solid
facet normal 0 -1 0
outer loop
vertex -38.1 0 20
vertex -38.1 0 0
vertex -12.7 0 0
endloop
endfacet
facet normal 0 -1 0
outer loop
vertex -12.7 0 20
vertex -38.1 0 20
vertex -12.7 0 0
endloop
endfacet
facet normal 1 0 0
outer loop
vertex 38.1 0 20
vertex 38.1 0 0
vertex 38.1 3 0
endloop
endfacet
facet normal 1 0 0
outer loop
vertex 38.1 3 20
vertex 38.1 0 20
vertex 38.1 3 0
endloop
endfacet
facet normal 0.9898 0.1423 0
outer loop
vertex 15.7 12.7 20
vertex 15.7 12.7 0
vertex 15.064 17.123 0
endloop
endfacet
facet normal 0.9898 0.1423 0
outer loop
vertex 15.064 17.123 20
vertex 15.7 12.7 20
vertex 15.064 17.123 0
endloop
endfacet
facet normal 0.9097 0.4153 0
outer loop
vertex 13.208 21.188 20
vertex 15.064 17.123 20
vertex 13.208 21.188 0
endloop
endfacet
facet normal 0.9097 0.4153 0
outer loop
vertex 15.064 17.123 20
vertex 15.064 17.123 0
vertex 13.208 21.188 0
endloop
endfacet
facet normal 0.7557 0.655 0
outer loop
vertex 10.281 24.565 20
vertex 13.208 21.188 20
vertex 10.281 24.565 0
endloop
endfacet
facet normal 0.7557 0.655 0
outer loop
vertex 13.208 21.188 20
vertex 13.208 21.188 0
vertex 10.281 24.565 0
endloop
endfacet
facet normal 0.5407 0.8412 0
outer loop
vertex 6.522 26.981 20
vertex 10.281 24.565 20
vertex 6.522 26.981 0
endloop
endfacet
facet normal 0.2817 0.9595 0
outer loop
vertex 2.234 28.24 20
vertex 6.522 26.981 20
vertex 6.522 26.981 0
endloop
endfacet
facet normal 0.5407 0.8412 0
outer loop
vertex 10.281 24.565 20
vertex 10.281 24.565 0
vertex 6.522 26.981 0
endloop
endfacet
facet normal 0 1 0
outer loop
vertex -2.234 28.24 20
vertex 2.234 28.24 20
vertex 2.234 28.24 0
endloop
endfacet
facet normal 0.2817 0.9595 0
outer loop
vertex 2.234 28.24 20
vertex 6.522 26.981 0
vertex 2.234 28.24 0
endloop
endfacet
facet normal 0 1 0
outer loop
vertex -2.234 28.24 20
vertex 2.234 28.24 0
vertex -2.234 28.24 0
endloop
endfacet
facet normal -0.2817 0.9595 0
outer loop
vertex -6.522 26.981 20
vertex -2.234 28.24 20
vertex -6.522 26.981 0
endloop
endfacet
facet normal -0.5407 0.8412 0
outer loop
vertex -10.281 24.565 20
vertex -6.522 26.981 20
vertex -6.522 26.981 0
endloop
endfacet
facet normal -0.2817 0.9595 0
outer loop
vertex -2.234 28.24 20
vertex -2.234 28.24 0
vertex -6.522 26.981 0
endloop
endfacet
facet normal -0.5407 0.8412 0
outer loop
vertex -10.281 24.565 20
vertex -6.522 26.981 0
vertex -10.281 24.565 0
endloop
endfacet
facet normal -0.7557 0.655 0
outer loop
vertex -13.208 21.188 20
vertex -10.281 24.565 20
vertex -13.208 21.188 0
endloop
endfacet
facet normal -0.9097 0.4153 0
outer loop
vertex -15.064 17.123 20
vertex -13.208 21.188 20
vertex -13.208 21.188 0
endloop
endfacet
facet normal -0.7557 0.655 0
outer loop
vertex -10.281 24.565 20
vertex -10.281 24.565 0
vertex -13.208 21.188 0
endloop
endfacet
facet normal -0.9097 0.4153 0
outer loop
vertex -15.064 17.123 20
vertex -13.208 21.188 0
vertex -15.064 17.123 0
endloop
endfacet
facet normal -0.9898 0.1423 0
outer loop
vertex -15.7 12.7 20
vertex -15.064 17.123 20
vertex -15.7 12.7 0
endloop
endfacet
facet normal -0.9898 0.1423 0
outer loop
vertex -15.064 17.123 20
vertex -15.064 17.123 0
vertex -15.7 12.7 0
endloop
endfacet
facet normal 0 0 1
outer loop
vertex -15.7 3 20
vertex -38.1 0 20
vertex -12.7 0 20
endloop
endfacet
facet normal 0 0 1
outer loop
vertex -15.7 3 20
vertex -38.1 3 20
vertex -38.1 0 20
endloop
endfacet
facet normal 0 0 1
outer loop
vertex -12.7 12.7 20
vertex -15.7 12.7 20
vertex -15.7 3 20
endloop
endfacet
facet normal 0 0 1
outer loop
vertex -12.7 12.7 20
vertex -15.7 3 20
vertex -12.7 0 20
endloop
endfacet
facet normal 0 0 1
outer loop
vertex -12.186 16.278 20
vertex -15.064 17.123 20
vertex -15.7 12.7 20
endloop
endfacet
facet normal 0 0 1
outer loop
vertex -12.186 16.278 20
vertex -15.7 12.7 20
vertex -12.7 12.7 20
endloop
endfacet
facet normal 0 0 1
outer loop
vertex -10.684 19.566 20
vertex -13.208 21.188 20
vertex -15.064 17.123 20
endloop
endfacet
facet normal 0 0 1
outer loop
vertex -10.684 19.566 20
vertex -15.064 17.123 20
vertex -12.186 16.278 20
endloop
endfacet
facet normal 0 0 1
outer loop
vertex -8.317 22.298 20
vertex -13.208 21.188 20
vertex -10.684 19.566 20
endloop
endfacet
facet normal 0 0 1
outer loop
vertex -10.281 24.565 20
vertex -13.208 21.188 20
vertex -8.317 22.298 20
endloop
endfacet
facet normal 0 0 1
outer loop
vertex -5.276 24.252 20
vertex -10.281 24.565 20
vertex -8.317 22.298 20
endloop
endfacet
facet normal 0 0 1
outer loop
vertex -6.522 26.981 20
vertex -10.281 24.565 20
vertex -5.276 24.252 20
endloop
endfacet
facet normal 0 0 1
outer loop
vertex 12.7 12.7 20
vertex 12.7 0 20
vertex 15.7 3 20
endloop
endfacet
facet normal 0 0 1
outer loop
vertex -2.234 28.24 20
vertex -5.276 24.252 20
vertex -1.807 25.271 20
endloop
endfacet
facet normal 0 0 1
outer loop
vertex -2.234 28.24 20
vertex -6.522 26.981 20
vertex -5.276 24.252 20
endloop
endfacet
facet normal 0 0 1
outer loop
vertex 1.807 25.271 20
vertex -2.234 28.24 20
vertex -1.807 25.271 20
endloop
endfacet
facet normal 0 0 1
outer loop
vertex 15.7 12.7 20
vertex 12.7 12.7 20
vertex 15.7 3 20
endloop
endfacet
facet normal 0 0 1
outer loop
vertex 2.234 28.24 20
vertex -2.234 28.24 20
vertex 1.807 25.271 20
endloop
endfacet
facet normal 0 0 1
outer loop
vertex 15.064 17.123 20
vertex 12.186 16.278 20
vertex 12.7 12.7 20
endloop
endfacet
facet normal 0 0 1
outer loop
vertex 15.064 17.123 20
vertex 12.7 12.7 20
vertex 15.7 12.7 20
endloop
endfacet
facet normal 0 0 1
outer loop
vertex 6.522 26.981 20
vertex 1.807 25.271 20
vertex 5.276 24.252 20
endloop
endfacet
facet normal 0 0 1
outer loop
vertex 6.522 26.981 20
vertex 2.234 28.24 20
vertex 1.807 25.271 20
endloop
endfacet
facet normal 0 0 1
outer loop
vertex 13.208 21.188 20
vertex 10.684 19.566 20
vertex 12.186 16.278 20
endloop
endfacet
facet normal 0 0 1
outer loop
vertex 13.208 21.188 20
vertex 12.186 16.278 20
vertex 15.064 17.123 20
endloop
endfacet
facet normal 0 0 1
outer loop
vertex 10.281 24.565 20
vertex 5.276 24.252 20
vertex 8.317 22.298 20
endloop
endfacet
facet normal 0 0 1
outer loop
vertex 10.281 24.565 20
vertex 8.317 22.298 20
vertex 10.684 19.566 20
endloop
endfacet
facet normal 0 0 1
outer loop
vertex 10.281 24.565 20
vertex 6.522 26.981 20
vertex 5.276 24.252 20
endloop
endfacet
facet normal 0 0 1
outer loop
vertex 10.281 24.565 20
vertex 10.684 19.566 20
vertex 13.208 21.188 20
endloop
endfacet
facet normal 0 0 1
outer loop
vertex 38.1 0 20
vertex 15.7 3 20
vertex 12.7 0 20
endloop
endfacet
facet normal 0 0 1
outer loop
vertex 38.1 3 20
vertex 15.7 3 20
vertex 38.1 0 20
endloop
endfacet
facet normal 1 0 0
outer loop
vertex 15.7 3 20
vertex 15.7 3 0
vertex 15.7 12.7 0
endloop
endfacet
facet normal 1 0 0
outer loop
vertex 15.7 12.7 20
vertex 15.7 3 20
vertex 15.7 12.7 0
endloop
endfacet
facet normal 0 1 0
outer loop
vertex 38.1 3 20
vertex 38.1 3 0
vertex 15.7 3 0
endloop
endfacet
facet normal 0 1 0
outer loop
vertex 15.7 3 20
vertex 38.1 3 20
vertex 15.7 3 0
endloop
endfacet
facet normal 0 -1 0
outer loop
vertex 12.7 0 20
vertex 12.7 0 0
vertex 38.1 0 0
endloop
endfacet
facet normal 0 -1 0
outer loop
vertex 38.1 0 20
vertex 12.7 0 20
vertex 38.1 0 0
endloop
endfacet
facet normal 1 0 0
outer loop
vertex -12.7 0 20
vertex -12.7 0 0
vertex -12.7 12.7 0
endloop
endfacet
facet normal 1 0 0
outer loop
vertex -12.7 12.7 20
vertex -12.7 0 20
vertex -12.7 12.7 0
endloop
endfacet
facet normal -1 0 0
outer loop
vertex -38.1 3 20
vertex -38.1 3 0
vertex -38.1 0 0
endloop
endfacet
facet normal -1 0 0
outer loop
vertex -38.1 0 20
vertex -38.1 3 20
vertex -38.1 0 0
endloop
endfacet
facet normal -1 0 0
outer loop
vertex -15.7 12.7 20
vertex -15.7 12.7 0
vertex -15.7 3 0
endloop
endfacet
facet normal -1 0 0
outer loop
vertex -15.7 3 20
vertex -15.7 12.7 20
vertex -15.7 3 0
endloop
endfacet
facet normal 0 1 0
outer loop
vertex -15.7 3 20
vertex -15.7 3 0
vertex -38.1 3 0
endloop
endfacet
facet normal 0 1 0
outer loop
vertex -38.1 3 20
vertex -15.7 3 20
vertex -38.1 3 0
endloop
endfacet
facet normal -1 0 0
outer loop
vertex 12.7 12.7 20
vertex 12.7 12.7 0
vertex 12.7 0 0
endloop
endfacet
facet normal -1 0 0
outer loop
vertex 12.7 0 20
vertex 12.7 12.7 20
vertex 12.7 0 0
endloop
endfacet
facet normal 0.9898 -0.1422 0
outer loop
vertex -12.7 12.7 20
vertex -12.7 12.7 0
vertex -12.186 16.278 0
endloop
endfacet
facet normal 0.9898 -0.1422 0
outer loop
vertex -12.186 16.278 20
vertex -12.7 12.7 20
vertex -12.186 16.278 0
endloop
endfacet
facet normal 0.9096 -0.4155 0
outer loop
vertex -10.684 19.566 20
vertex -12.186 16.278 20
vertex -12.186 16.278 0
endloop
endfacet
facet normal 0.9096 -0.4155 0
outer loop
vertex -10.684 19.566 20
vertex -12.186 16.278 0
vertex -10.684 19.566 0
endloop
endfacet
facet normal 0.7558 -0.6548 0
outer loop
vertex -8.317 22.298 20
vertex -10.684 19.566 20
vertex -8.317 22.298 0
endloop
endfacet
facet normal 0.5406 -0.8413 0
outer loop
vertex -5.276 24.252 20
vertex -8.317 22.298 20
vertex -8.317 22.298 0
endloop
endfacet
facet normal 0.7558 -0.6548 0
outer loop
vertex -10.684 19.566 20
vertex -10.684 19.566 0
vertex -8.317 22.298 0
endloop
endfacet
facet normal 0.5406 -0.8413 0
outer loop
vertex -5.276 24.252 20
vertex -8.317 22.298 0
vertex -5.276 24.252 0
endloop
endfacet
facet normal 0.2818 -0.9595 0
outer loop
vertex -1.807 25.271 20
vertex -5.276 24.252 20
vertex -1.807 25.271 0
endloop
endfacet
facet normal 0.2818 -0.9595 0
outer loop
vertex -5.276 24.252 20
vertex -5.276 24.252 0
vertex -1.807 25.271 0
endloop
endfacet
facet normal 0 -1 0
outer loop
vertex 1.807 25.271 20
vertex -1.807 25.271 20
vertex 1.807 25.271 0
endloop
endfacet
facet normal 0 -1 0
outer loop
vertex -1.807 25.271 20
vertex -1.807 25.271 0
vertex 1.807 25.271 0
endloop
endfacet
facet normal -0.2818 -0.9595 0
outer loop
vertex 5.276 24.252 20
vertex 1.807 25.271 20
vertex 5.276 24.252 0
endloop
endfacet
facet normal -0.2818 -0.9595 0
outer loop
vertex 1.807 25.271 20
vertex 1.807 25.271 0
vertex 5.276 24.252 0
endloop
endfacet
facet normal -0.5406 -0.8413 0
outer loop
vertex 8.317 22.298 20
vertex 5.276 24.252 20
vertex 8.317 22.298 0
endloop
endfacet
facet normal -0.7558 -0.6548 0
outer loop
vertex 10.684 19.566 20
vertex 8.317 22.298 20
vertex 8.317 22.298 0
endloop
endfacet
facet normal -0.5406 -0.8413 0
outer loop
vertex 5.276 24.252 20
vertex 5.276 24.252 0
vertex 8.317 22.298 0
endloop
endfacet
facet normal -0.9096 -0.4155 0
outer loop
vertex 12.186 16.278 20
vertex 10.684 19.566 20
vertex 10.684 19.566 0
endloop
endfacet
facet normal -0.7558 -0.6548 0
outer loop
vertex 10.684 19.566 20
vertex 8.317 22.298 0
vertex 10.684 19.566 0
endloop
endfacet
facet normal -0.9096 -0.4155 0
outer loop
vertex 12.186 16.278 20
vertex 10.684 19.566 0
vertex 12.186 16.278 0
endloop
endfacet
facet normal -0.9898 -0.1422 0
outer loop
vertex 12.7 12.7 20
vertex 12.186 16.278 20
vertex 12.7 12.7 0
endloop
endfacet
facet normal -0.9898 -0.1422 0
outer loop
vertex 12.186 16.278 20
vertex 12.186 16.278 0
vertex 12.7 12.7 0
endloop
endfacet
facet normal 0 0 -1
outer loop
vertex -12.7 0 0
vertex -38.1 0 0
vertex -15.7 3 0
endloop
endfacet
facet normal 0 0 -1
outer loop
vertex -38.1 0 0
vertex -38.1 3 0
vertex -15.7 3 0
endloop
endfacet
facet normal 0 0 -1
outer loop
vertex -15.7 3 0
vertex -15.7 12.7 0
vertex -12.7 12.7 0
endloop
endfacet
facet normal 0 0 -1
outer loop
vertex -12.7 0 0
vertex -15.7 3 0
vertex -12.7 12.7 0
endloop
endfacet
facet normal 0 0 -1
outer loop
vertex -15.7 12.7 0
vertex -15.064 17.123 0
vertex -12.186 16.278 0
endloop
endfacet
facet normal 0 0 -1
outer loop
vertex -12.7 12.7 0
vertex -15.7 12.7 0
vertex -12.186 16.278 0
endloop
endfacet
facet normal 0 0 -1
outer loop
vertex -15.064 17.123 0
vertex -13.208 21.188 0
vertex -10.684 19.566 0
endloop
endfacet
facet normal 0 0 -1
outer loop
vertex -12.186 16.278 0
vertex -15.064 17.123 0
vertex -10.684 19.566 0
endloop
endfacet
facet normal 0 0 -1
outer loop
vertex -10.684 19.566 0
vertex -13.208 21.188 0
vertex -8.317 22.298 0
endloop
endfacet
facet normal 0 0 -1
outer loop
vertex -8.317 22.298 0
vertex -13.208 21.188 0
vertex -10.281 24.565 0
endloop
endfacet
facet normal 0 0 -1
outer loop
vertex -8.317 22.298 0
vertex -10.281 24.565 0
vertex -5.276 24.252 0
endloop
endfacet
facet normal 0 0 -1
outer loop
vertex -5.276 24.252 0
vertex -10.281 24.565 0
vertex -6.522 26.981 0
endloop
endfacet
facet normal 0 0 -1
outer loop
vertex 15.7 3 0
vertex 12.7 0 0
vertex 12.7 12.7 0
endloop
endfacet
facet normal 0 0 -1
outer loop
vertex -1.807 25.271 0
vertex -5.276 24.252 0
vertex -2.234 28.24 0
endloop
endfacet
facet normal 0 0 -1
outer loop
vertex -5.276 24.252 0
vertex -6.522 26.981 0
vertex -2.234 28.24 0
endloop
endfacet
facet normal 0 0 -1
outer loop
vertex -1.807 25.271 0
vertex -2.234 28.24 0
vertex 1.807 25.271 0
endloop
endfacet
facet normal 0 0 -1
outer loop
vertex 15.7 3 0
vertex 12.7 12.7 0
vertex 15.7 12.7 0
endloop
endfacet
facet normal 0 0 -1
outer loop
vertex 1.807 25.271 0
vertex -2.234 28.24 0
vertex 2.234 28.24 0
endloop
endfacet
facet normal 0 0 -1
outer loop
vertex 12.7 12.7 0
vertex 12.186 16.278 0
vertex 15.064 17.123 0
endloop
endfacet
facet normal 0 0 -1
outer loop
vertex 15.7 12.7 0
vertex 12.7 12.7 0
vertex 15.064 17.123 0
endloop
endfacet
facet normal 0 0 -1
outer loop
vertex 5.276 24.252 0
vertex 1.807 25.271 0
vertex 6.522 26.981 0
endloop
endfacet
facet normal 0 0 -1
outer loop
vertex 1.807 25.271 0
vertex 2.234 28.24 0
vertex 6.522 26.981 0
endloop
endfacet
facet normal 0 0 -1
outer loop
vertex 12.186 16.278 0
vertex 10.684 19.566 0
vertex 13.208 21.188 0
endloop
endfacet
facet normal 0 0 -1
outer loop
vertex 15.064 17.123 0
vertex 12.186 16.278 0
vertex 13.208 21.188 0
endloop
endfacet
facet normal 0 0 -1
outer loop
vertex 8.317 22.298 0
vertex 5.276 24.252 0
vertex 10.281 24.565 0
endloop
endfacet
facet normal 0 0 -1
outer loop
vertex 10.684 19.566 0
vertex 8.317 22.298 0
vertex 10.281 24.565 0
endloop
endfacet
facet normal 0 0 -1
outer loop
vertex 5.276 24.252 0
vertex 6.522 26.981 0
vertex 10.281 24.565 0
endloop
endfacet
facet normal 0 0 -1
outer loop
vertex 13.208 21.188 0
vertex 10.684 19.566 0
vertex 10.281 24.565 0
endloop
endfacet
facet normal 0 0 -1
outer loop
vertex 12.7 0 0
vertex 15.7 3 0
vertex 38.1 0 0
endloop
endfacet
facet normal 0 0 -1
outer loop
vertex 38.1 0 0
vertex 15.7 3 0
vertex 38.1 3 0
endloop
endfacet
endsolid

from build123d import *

# Parameters (mm, degrees)
EXTRUDE_THIN1_DEPTH = 20


with BuildPart() as part:
    # Sketch1 → Extrude-Thin1 (new body)
    with BuildSketch(Plane.XY):
        with BuildLine():
            Line((-38.1, 0), (-12.7, 0))
            Line((-12.7, 0), (-12.7, 12.7))
            ThreePointArc((-12.7, 12.7), (0, 25.4), (12.7, 12.7))
            Line((12.7, 12.7), (12.7, 0))
            Line((12.7, 0), (38.1, 0))
            Line((38.1, 0), (38.1, 3))
            Line((38.1, 3), (15.7, 3))
            Line((15.7, 3), (15.7, 12.7))
            ThreePointArc((15.7, 12.7), (0, 28.4), (-15.7, 12.7))
            Line((-15.7, 12.7), (-15.7, 3))
            Line((-15.7, 3), (-38.1, 3))
            Line((-38.1, 3), (-38.1, 0))
        make_face()
    extrude(amount=EXTRUDE_THIN1_DEPTH)


solid = part.part
